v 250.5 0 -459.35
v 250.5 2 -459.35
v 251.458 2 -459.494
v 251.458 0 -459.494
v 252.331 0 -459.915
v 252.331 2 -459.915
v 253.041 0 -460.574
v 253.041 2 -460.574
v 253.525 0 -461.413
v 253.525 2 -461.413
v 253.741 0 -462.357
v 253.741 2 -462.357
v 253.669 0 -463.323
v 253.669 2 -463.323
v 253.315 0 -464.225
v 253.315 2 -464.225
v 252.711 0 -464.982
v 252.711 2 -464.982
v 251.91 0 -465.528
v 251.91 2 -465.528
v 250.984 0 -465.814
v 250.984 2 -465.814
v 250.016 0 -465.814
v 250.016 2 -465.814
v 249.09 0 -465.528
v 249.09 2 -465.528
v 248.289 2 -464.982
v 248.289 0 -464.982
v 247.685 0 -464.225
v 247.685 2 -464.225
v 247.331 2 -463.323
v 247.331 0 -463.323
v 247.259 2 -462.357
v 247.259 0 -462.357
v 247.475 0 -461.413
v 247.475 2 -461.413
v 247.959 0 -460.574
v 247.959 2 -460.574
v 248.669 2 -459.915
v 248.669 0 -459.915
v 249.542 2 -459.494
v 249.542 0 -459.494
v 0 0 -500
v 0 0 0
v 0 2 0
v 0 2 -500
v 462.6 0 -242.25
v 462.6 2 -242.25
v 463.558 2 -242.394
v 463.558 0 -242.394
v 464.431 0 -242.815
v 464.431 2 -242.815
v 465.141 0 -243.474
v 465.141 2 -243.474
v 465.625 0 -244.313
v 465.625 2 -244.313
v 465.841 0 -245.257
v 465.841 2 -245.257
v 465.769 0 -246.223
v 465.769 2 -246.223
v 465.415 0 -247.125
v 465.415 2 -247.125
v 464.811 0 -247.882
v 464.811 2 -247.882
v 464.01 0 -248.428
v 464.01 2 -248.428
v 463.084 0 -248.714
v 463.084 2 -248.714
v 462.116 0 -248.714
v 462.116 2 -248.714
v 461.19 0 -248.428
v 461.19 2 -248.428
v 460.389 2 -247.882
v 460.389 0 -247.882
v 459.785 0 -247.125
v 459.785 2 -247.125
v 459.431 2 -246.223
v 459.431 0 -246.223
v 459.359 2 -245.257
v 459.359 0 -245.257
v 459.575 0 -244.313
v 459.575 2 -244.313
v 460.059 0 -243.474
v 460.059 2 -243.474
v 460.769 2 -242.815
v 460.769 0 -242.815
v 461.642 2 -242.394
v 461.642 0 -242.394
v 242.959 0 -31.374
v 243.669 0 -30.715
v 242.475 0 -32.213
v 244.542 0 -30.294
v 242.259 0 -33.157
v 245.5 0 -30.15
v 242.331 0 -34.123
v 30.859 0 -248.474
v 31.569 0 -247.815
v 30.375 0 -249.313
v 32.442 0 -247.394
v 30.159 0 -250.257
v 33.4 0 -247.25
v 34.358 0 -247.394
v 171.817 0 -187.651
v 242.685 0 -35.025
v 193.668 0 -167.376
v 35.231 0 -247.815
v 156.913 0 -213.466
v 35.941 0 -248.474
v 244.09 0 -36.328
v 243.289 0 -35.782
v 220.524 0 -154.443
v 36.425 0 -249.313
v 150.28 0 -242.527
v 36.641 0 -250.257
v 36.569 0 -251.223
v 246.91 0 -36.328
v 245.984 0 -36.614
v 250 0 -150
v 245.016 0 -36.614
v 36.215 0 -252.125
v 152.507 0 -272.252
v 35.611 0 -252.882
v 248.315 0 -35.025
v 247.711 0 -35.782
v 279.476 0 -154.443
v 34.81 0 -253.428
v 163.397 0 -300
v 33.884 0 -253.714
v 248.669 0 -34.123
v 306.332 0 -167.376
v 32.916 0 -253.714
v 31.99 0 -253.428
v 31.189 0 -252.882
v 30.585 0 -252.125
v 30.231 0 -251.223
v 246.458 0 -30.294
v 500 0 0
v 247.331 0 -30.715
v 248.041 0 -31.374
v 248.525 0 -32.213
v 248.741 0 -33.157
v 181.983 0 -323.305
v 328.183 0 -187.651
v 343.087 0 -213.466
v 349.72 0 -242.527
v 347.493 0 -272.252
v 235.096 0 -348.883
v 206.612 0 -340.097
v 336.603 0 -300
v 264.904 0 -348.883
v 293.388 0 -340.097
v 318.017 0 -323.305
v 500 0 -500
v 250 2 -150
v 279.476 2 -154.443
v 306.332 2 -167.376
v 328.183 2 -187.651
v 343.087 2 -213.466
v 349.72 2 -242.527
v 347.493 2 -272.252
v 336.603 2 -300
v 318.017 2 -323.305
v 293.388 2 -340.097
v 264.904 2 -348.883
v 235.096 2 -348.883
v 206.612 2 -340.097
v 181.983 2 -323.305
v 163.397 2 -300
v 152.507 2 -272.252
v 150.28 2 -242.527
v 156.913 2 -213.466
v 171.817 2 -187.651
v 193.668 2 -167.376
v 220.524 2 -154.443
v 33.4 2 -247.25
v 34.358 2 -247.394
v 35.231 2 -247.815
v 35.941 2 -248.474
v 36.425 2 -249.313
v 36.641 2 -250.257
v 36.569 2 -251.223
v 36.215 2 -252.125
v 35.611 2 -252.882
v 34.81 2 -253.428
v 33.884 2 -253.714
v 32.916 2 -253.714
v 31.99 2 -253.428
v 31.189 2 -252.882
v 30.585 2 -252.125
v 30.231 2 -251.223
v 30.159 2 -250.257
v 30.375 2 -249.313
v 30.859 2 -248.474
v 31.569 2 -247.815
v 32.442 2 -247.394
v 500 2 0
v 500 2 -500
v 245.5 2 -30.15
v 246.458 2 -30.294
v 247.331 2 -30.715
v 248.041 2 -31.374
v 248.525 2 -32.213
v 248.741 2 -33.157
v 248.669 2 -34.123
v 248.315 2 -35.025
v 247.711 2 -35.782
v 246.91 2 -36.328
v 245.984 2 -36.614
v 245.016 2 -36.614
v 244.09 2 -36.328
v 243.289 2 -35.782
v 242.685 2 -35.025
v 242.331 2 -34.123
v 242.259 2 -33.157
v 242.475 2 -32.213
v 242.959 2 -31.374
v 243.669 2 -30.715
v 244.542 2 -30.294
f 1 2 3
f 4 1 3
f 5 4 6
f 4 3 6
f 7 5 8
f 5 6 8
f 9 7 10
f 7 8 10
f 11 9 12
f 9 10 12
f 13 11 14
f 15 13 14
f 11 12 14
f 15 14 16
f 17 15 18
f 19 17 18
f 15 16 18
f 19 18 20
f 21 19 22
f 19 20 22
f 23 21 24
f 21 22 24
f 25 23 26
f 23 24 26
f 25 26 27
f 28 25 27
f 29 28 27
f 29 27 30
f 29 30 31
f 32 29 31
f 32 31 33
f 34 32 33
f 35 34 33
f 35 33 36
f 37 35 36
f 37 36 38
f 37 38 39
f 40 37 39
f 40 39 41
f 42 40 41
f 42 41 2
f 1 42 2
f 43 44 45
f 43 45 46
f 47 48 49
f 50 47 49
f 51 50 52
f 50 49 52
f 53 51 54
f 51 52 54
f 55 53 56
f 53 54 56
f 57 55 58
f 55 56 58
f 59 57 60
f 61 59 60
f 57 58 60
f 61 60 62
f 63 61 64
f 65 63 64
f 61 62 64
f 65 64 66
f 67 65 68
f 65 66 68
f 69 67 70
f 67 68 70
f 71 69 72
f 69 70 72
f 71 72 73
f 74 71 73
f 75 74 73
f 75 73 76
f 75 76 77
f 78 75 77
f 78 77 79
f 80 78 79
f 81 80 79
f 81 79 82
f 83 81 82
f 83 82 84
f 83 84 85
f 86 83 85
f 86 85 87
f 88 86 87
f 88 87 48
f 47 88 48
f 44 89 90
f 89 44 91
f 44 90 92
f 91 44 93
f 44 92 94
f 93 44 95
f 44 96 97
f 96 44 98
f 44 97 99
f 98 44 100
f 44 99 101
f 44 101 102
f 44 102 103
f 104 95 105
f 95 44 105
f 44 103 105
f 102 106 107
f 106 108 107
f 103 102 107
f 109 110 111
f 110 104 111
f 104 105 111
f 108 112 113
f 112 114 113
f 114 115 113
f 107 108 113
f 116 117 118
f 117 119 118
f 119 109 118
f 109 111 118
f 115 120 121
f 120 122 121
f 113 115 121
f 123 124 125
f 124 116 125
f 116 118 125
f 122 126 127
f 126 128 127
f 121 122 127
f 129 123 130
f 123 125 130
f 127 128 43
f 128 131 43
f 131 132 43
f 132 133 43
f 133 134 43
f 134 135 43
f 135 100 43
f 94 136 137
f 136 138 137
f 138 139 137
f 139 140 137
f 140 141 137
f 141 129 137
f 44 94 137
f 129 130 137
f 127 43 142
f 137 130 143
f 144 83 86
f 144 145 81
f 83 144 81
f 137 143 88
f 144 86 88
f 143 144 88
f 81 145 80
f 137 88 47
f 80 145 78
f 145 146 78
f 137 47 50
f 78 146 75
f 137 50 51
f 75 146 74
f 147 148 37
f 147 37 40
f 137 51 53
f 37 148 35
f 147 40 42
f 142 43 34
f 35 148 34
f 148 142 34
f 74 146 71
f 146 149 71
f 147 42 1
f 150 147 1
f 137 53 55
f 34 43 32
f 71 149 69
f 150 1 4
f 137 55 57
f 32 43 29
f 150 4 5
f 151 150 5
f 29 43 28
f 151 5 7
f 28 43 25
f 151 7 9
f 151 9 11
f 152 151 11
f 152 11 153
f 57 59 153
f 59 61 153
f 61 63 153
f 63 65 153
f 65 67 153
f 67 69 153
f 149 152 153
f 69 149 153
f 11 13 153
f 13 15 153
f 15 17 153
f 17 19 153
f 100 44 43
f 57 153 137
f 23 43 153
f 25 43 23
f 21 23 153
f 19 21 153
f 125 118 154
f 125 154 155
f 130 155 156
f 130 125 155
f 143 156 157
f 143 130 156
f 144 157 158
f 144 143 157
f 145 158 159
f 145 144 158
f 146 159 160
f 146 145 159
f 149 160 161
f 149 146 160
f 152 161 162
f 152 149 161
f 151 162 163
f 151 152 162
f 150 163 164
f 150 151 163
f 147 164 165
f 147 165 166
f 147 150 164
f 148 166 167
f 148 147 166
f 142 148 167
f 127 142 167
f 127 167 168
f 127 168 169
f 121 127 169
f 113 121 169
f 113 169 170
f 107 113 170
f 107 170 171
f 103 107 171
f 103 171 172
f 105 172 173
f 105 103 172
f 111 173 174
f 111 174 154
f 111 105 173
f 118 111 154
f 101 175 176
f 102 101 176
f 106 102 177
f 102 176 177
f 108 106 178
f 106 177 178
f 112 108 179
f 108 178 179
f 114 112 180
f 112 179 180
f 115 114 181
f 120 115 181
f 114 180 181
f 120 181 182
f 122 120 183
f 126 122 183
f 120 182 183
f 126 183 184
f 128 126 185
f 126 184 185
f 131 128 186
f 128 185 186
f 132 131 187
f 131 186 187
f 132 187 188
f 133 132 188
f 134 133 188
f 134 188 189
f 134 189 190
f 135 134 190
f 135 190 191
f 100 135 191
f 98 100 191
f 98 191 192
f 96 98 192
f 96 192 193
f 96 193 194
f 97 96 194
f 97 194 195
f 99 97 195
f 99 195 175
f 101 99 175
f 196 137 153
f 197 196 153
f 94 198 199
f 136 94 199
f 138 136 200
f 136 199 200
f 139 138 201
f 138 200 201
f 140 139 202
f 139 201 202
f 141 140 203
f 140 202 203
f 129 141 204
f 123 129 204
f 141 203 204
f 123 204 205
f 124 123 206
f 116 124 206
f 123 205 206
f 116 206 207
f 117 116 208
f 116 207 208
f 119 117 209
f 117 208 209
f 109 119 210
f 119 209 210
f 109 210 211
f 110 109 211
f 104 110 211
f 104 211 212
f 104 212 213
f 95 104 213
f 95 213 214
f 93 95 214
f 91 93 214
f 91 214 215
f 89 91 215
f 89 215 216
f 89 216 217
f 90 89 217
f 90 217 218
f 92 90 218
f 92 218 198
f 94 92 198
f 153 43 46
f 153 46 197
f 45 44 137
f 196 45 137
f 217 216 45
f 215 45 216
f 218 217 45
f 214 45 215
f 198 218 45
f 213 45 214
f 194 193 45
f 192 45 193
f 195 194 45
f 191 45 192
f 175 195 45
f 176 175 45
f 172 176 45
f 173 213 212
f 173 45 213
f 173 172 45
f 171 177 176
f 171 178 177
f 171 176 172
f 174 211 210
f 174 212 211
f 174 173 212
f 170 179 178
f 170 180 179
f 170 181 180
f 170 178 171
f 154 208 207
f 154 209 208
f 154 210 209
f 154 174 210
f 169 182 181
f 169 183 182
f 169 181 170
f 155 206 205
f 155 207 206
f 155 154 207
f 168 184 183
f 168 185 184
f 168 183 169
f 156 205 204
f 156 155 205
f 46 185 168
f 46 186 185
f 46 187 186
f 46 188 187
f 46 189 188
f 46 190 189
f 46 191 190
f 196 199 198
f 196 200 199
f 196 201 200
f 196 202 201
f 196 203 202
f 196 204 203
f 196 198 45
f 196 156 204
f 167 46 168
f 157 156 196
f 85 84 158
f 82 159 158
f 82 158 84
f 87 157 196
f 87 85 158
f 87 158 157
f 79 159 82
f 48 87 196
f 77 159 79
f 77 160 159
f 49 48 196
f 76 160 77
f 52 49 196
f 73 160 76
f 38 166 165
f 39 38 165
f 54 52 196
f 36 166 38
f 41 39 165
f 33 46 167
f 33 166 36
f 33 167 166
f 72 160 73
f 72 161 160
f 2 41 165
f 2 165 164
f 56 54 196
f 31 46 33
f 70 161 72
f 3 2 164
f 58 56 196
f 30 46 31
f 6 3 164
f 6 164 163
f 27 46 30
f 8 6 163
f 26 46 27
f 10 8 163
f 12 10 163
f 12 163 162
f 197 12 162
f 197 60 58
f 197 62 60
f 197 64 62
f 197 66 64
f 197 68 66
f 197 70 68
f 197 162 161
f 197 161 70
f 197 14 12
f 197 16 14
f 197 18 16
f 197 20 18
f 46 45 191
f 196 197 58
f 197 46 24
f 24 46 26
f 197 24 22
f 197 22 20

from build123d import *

# Parameters (mm, degrees)
SKETCH1_W           = 500
SKETCH1_H           = 500
SKETCH1_R           = 100
BOSS_EXTRUDE1_DEPTH = 2
SKETCH_1_R          = 3.25
CUT_EXTRUDE_1_DEPTH = 10


with BuildPart() as part:
    # Sketch1 → Boss-Extrude1 (new body)
    with BuildSketch(Plane(origin=(0, 0, 0), x_dir=(1, 0, 0), z_dir=(0, 1, 0))):
        with Locations((250, 250)):
            Rectangle(SKETCH1_W, SKETCH1_H)
        with Locations(Location((250, 250, 0), (0, 0, 270))):
            Circle(SKETCH1_R, mode=Mode.SUBTRACT)
    extrude(amount=BOSS_EXTRUDE1_DEPTH)

    # 草图1 → 切除-拉伸1 (cut)
    with BuildSketch(Plane(origin=(0, 2, 0), x_dir=(1, 0, 0), z_dir=(0, 1, 0))):
        with Locations(Location((245.5, 33.4, 0), (0, 0, 270))):
            Circle(SKETCH_1_R)
        with Locations(Location((33.4, 250.5, 0), (0, 0, 270))):
            Circle(SKETCH_1_R)
        with Locations(Location((462.6, 245.5, 0), (0, 0, 270))):
            Circle(SKETCH_1_R)
        with Locations(Location((250.5, 462.6, 0), (0, 0, 270))):
            Circle(SKETCH_1_R)
    extrude(amount=-CUT_EXTRUDE_1_DEPTH, mode=Mode.SUBTRACT)


solid = part.part
